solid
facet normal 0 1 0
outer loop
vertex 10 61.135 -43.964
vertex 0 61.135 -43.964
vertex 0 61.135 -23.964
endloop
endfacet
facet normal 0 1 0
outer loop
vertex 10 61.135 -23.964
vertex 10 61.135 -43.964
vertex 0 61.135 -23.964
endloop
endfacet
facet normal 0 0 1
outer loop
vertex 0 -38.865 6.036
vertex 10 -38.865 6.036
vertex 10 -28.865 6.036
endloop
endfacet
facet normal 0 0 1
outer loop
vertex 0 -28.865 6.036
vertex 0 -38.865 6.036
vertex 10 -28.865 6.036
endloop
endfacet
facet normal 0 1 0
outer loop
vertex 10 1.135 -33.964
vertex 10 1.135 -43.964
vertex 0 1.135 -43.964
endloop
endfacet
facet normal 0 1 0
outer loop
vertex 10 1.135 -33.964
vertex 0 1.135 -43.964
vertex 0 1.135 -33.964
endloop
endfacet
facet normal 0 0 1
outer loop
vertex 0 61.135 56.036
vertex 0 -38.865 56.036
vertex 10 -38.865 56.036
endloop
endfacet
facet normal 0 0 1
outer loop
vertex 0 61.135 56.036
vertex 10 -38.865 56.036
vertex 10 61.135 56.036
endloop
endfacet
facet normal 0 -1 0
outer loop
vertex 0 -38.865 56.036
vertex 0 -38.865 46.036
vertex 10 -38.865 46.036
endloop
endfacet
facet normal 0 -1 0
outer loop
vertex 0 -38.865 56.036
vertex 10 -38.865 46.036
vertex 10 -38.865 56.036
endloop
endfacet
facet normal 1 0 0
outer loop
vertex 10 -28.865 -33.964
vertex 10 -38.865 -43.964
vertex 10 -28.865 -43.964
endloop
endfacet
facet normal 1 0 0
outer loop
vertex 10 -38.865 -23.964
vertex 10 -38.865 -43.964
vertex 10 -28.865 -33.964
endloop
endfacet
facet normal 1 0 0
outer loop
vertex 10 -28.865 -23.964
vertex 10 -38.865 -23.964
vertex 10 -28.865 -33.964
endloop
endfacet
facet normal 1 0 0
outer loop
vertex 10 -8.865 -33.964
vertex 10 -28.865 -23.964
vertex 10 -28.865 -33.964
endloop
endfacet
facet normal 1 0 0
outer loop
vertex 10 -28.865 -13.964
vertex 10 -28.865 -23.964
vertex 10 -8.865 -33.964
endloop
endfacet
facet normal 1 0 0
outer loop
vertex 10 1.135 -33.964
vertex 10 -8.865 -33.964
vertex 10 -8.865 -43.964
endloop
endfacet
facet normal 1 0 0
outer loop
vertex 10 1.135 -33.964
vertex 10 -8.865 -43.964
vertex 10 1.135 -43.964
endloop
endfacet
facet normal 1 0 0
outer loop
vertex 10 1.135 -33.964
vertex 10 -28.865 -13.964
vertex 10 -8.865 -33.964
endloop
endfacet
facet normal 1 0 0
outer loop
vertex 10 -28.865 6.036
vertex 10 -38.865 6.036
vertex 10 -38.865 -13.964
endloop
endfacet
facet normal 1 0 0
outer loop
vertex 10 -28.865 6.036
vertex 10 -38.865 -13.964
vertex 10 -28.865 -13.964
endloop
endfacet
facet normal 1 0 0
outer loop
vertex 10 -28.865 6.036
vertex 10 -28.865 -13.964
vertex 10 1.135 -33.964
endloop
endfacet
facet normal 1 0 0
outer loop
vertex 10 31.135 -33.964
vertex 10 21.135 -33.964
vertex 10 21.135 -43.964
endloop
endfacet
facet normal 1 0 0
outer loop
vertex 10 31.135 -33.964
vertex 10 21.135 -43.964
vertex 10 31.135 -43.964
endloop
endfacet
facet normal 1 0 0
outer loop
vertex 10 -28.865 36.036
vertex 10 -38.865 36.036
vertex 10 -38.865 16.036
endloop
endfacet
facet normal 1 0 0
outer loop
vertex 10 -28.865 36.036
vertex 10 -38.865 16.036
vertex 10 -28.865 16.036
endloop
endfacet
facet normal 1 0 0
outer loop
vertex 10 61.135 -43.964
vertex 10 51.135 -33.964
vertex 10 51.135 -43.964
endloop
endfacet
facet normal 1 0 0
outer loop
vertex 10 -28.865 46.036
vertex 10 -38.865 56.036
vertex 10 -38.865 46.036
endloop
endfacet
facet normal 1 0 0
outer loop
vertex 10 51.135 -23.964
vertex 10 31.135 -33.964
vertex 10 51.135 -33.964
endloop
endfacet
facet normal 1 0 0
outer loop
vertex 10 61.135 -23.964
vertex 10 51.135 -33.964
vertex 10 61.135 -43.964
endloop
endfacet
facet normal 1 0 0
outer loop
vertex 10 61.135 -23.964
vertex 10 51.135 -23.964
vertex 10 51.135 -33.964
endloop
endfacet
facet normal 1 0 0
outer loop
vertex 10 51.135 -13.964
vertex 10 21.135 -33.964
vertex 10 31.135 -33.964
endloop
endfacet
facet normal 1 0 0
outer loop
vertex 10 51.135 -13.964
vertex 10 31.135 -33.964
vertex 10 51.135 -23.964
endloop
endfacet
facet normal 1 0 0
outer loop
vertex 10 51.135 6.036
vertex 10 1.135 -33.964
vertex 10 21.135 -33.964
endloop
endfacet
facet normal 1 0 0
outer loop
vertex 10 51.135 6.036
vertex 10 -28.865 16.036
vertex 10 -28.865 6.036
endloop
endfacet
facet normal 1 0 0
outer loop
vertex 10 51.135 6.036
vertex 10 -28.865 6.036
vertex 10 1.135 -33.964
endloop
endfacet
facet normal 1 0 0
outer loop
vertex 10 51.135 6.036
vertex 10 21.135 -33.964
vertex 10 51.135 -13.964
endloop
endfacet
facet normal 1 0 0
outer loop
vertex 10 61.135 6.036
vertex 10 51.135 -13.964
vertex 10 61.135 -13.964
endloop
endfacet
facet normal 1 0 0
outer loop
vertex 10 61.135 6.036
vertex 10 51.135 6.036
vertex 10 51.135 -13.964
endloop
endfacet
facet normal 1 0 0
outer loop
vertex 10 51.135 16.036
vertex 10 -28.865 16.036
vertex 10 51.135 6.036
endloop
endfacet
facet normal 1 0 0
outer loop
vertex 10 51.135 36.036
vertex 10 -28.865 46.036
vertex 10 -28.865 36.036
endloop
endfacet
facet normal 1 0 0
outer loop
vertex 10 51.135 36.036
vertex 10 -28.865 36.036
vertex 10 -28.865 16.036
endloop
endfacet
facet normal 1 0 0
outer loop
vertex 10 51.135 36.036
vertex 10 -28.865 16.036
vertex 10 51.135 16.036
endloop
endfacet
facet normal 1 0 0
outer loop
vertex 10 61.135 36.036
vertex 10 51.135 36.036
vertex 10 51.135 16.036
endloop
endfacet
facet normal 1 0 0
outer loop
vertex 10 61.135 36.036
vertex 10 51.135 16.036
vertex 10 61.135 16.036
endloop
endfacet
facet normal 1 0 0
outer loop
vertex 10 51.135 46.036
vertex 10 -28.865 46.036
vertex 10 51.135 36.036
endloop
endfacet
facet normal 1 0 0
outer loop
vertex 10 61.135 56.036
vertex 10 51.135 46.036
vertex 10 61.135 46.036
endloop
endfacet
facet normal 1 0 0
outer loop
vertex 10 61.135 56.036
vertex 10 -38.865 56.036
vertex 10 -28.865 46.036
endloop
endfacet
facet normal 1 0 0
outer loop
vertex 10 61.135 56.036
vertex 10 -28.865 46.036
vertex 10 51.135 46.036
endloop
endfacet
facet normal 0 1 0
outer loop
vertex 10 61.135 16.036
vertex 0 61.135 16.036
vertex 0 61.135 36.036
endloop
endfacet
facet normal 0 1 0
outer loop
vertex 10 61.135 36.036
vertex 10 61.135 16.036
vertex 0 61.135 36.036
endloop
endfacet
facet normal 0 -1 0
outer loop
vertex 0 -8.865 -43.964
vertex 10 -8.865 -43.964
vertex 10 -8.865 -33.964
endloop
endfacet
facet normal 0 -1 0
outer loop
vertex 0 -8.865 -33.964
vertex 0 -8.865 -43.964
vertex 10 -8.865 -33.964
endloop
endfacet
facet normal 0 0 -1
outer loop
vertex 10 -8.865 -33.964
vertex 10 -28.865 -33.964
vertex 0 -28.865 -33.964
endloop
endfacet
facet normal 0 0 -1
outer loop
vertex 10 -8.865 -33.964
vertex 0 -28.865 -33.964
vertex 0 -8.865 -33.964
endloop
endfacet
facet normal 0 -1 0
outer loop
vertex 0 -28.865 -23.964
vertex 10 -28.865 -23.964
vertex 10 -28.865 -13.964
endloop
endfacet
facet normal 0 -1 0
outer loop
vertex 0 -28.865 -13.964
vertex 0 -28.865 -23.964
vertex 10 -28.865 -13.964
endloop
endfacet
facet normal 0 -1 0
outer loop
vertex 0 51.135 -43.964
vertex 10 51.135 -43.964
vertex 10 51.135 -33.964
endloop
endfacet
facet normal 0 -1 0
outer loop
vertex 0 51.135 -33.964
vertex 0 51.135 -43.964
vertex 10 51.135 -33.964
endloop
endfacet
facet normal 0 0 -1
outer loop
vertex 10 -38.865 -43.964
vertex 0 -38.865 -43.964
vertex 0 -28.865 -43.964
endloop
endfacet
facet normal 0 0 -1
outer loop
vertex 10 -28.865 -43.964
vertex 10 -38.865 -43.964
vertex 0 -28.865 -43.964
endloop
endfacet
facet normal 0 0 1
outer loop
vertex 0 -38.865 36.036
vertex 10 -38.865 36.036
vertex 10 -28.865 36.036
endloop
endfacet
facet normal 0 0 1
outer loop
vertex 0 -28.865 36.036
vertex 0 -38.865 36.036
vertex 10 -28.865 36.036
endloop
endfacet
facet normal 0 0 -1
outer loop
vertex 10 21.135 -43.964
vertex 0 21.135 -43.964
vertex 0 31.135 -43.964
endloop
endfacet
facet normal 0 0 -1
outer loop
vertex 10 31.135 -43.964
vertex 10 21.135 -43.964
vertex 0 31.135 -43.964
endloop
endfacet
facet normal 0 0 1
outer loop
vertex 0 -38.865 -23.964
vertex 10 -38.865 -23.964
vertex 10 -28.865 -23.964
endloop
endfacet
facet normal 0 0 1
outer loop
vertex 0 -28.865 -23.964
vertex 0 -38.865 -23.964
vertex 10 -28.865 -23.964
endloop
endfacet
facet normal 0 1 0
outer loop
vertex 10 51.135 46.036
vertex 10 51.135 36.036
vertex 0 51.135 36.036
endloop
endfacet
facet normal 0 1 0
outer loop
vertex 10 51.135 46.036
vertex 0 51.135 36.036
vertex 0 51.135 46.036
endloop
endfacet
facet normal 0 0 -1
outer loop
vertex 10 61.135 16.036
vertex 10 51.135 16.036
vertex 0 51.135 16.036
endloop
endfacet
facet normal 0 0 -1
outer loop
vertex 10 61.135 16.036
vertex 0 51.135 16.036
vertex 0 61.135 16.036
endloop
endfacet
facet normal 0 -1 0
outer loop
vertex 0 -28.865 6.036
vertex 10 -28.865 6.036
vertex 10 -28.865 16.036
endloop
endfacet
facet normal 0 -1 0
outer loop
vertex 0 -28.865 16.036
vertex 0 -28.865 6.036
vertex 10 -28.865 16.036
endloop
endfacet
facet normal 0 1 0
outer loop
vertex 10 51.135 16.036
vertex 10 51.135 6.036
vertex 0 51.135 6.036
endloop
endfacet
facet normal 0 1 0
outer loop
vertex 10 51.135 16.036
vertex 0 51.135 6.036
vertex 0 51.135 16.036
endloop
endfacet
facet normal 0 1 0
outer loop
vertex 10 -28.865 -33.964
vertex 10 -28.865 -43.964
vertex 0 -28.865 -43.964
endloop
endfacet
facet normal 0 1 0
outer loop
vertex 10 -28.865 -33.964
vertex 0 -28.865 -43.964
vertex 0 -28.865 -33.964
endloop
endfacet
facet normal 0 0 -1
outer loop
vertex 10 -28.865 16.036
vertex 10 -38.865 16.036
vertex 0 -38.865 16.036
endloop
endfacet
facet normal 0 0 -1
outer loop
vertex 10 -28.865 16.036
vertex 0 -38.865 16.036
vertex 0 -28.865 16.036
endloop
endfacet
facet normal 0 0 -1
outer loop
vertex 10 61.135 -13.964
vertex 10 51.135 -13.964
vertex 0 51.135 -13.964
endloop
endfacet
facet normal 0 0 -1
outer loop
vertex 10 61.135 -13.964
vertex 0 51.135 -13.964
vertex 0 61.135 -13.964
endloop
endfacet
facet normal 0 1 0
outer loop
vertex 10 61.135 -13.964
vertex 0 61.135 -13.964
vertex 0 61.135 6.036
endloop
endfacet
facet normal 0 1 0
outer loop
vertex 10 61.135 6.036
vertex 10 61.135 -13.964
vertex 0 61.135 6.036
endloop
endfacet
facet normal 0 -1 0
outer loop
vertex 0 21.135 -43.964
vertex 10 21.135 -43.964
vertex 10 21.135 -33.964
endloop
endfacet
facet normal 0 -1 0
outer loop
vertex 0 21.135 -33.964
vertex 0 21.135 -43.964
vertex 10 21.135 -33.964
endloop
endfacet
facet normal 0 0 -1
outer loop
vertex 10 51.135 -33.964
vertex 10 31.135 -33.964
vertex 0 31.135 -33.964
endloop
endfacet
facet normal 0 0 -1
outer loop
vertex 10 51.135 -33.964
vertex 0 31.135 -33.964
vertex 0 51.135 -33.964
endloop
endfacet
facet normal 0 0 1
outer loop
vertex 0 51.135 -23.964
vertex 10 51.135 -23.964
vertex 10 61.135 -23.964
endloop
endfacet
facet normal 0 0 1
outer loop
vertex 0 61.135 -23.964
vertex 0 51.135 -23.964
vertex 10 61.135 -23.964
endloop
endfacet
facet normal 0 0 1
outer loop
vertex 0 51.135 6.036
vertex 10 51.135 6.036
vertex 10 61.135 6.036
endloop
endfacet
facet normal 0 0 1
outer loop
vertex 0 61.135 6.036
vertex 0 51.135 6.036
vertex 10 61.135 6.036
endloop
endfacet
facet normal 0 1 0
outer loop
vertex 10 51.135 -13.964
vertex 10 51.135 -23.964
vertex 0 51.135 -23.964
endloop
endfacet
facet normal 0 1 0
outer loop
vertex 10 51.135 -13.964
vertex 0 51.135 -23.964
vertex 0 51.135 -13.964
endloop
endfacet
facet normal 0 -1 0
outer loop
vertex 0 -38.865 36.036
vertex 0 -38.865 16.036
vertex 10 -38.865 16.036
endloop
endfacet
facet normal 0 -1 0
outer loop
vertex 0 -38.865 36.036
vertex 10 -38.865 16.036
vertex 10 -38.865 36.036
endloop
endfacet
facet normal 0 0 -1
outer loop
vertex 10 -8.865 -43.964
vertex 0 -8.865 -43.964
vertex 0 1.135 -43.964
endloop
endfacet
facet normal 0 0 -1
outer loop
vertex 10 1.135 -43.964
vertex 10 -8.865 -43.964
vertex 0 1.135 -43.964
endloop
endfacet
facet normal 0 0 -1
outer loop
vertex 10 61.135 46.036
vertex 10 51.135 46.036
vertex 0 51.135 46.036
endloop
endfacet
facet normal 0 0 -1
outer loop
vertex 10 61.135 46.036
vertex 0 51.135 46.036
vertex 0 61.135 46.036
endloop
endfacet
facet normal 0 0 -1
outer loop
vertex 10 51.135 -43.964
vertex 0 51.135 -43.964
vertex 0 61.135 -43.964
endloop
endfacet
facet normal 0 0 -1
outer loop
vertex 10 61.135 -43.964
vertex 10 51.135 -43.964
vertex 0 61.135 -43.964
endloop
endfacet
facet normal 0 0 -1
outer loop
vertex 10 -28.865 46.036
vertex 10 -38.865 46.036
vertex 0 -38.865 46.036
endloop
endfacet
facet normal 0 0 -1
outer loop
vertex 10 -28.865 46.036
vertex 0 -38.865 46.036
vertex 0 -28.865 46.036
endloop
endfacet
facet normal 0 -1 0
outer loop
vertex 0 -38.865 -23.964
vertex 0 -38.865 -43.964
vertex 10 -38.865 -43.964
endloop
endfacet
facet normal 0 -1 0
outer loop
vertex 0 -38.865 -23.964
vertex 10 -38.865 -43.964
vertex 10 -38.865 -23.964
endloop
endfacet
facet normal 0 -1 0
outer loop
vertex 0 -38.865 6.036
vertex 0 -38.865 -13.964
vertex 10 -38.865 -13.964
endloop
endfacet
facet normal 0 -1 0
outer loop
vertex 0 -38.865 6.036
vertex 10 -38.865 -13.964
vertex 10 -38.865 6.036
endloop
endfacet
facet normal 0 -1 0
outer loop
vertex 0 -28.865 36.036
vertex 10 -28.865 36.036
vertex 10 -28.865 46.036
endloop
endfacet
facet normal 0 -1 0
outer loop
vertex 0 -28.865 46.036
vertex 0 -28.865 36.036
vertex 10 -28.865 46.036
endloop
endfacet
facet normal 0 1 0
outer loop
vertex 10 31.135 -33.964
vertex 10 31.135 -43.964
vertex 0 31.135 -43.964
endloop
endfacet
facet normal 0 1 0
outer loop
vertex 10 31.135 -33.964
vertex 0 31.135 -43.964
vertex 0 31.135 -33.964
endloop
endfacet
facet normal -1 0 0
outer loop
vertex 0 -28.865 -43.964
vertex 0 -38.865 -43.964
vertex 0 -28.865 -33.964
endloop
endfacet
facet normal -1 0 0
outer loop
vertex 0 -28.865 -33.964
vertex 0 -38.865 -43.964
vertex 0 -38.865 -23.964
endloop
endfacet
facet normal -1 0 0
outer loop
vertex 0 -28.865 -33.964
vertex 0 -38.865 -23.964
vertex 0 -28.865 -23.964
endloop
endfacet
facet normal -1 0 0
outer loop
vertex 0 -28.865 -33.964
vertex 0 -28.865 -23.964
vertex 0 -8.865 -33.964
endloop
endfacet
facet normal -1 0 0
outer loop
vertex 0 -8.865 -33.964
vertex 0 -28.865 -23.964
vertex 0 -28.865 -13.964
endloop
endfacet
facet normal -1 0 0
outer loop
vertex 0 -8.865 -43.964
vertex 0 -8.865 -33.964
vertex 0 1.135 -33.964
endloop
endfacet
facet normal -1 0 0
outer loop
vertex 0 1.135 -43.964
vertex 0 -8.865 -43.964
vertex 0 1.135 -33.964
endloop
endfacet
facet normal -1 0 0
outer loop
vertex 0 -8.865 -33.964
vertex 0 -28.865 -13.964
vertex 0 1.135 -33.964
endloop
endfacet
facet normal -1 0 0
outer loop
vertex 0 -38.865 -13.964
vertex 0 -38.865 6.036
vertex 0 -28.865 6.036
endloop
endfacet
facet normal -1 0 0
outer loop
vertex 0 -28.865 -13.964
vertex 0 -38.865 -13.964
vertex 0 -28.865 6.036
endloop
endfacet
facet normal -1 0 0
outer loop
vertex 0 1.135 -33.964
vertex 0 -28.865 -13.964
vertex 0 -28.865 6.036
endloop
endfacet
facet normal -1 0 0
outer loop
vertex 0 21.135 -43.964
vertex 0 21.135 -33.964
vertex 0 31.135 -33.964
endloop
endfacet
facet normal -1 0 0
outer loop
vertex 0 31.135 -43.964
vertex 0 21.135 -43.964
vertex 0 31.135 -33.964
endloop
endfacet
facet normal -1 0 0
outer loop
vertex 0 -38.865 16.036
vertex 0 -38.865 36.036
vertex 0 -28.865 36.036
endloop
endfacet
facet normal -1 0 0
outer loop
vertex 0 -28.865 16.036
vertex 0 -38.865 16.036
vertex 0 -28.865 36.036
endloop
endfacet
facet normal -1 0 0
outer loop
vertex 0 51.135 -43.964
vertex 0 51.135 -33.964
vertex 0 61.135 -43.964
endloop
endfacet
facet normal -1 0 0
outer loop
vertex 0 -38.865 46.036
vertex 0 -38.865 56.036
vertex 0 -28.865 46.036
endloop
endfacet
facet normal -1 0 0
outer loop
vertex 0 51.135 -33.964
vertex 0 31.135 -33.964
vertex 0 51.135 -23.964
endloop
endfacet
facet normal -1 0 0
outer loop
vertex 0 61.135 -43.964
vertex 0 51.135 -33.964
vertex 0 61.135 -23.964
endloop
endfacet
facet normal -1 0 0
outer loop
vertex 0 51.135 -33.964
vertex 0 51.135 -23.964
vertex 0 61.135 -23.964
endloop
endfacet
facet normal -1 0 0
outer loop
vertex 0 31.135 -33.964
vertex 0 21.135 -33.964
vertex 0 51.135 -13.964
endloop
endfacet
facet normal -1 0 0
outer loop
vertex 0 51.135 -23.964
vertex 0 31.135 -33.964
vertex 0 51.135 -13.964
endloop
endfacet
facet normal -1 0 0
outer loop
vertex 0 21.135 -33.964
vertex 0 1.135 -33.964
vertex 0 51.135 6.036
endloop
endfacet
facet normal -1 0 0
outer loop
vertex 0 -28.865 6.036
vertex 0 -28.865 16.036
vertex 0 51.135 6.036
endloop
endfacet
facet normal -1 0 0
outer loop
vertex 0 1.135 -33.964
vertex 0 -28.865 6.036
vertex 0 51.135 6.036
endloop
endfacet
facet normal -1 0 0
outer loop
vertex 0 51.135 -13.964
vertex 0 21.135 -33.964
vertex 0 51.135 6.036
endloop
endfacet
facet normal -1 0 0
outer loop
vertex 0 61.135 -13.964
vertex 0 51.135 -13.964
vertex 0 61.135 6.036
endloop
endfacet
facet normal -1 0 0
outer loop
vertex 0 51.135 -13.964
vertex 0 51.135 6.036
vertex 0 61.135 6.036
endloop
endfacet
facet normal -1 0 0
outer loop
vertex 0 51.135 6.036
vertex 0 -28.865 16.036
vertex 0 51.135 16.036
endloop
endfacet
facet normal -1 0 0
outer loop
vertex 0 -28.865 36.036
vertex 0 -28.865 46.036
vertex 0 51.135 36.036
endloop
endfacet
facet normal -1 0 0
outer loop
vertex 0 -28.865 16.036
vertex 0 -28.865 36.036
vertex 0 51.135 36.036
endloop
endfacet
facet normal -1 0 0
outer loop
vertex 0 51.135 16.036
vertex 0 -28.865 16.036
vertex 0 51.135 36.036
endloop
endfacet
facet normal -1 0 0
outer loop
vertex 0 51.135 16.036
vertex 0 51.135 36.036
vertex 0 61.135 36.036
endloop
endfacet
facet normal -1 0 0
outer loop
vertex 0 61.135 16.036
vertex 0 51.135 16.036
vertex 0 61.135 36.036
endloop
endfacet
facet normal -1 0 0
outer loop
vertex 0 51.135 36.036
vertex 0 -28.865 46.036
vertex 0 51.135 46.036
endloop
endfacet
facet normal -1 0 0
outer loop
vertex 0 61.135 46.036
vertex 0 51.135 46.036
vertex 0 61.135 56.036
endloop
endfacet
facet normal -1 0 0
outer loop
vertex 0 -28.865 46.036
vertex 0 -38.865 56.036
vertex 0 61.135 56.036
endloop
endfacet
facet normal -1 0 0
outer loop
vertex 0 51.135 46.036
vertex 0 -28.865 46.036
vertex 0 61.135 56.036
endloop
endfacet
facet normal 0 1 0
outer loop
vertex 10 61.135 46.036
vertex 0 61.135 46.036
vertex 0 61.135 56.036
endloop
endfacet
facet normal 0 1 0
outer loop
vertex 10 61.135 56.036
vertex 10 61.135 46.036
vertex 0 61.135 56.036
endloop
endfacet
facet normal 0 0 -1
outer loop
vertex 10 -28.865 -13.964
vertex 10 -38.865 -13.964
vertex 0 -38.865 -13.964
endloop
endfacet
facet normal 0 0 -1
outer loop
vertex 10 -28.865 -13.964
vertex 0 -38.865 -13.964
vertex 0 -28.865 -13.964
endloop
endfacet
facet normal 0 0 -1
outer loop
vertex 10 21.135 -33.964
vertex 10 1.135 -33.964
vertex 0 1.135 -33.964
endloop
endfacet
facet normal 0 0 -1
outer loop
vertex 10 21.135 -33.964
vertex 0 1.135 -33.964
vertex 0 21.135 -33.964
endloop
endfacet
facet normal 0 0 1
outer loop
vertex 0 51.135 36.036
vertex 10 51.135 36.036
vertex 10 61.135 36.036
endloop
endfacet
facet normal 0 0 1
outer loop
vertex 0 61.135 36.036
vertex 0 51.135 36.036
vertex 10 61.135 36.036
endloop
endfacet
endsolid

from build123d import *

# Parameters (mm, degrees)
F0_W      = 100
F0_H      = 100
F1_DEPTH  = 10
F2_W      = 20
F2_H      = 10
F3_DEPTH  = 10
F4_W      = 20
F4_H      = 10
F5_DEPTH  = 10
F6_W      = 20
F6_H      = 10
F7_DEPTH  = 10
F8_W      = 10
F8_H      = 10
F9_DEPTH  = 10
F10_W     = 10
F10_H     = 10
F11_DEPTH = 10
F12_W     = 10
F12_H     = 10
F13_DEPTH = 10
F14_W     = 10
F14_H     = 10
F15_DEPTH = 10
F16_W     = 10
F16_H     = 10
F17_DEPTH = 10
F18_W     = 10
F18_H     = 10
F19_DEPTH = 10


with BuildPart() as f1:
    # F0 (on Right) → F1 (new body)
    with BuildSketch(Plane.YZ):
        with Locations((11.134875, 6.03618)):
            Rectangle(F0_W, F0_H)
    extrude(amount=F1_DEPTH)

    # F2 (on face) → F3 (cut)
    with BuildSketch(Plane.YZ.offset(10)):
        with Locations((-18.865125, -38.96382)):
            Rectangle(F2_W, F2_H)
    extrude(amount=-F3_DEPTH, mode=Mode.SUBTRACT)

    # F4 (on face) → F5 (cut)
    with BuildSketch(Plane.YZ.offset(10)):
        with Locations((11.134875, -38.96382)):
            Rectangle(F4_W, F4_H)
    extrude(amount=-F5_DEPTH, mode=Mode.SUBTRACT)

    # F6 (on face) → F7 (cut)
    with BuildSketch(Plane.YZ.offset(10)):
        with Locations((41.134875, -38.96382)):
            Rectangle(F6_W, F6_H)
    extrude(amount=-F7_DEPTH, mode=Mode.SUBTRACT)

    # F8 (on face) → F9 (cut)
    with BuildSketch(Plane.YZ.offset(10)):
        with Locations((-33.865125, -18.96382)):
            Rectangle(F8_W, F8_H)
    extrude(amount=-F9_DEPTH, mode=Mode.SUBTRACT)

    # F10 (on face) → F11 (cut)
    with BuildSketch(Plane.YZ.offset(10)):
        with Locations((-33.865125, 11.03618)):
            Rectangle(F10_W, F10_H)
    extrude(amount=-F11_DEPTH, mode=Mode.SUBTRACT)

    # F12 (on face) → F13 (cut)
    with BuildSketch(Plane.YZ.offset(10)):
        with Locations((-33.865125, 41.03618)):
            Rectangle(F12_W, F12_H)
    extrude(amount=-F13_DEPTH, mode=Mode.SUBTRACT)

    # F14 (on face) → F15 (cut)
    with BuildSketch(Plane.YZ.offset(10)):
        with Locations((56.134875, -18.96382)):
            Rectangle(F14_W, F14_H)
    extrude(amount=-F15_DEPTH, mode=Mode.SUBTRACT)

    # F16 (on face) → F17 (cut)
    with BuildSketch(Plane.YZ.offset(10)):
        with Locations((56.134875, 11.03618)):
            Rectangle(F16_W, F16_H)
    extrude(amount=-F17_DEPTH, mode=Mode.SUBTRACT)

    # F18 (on face) → F19 (cut)
    with BuildSketch(Plane.YZ.offset(10)):
        with Locations((56.134875, 41.03618)):
            Rectangle(F18_W, F18_H)
    extrude(amount=-F19_DEPTH, mode=Mode.SUBTRACT)


solid = f1.part
